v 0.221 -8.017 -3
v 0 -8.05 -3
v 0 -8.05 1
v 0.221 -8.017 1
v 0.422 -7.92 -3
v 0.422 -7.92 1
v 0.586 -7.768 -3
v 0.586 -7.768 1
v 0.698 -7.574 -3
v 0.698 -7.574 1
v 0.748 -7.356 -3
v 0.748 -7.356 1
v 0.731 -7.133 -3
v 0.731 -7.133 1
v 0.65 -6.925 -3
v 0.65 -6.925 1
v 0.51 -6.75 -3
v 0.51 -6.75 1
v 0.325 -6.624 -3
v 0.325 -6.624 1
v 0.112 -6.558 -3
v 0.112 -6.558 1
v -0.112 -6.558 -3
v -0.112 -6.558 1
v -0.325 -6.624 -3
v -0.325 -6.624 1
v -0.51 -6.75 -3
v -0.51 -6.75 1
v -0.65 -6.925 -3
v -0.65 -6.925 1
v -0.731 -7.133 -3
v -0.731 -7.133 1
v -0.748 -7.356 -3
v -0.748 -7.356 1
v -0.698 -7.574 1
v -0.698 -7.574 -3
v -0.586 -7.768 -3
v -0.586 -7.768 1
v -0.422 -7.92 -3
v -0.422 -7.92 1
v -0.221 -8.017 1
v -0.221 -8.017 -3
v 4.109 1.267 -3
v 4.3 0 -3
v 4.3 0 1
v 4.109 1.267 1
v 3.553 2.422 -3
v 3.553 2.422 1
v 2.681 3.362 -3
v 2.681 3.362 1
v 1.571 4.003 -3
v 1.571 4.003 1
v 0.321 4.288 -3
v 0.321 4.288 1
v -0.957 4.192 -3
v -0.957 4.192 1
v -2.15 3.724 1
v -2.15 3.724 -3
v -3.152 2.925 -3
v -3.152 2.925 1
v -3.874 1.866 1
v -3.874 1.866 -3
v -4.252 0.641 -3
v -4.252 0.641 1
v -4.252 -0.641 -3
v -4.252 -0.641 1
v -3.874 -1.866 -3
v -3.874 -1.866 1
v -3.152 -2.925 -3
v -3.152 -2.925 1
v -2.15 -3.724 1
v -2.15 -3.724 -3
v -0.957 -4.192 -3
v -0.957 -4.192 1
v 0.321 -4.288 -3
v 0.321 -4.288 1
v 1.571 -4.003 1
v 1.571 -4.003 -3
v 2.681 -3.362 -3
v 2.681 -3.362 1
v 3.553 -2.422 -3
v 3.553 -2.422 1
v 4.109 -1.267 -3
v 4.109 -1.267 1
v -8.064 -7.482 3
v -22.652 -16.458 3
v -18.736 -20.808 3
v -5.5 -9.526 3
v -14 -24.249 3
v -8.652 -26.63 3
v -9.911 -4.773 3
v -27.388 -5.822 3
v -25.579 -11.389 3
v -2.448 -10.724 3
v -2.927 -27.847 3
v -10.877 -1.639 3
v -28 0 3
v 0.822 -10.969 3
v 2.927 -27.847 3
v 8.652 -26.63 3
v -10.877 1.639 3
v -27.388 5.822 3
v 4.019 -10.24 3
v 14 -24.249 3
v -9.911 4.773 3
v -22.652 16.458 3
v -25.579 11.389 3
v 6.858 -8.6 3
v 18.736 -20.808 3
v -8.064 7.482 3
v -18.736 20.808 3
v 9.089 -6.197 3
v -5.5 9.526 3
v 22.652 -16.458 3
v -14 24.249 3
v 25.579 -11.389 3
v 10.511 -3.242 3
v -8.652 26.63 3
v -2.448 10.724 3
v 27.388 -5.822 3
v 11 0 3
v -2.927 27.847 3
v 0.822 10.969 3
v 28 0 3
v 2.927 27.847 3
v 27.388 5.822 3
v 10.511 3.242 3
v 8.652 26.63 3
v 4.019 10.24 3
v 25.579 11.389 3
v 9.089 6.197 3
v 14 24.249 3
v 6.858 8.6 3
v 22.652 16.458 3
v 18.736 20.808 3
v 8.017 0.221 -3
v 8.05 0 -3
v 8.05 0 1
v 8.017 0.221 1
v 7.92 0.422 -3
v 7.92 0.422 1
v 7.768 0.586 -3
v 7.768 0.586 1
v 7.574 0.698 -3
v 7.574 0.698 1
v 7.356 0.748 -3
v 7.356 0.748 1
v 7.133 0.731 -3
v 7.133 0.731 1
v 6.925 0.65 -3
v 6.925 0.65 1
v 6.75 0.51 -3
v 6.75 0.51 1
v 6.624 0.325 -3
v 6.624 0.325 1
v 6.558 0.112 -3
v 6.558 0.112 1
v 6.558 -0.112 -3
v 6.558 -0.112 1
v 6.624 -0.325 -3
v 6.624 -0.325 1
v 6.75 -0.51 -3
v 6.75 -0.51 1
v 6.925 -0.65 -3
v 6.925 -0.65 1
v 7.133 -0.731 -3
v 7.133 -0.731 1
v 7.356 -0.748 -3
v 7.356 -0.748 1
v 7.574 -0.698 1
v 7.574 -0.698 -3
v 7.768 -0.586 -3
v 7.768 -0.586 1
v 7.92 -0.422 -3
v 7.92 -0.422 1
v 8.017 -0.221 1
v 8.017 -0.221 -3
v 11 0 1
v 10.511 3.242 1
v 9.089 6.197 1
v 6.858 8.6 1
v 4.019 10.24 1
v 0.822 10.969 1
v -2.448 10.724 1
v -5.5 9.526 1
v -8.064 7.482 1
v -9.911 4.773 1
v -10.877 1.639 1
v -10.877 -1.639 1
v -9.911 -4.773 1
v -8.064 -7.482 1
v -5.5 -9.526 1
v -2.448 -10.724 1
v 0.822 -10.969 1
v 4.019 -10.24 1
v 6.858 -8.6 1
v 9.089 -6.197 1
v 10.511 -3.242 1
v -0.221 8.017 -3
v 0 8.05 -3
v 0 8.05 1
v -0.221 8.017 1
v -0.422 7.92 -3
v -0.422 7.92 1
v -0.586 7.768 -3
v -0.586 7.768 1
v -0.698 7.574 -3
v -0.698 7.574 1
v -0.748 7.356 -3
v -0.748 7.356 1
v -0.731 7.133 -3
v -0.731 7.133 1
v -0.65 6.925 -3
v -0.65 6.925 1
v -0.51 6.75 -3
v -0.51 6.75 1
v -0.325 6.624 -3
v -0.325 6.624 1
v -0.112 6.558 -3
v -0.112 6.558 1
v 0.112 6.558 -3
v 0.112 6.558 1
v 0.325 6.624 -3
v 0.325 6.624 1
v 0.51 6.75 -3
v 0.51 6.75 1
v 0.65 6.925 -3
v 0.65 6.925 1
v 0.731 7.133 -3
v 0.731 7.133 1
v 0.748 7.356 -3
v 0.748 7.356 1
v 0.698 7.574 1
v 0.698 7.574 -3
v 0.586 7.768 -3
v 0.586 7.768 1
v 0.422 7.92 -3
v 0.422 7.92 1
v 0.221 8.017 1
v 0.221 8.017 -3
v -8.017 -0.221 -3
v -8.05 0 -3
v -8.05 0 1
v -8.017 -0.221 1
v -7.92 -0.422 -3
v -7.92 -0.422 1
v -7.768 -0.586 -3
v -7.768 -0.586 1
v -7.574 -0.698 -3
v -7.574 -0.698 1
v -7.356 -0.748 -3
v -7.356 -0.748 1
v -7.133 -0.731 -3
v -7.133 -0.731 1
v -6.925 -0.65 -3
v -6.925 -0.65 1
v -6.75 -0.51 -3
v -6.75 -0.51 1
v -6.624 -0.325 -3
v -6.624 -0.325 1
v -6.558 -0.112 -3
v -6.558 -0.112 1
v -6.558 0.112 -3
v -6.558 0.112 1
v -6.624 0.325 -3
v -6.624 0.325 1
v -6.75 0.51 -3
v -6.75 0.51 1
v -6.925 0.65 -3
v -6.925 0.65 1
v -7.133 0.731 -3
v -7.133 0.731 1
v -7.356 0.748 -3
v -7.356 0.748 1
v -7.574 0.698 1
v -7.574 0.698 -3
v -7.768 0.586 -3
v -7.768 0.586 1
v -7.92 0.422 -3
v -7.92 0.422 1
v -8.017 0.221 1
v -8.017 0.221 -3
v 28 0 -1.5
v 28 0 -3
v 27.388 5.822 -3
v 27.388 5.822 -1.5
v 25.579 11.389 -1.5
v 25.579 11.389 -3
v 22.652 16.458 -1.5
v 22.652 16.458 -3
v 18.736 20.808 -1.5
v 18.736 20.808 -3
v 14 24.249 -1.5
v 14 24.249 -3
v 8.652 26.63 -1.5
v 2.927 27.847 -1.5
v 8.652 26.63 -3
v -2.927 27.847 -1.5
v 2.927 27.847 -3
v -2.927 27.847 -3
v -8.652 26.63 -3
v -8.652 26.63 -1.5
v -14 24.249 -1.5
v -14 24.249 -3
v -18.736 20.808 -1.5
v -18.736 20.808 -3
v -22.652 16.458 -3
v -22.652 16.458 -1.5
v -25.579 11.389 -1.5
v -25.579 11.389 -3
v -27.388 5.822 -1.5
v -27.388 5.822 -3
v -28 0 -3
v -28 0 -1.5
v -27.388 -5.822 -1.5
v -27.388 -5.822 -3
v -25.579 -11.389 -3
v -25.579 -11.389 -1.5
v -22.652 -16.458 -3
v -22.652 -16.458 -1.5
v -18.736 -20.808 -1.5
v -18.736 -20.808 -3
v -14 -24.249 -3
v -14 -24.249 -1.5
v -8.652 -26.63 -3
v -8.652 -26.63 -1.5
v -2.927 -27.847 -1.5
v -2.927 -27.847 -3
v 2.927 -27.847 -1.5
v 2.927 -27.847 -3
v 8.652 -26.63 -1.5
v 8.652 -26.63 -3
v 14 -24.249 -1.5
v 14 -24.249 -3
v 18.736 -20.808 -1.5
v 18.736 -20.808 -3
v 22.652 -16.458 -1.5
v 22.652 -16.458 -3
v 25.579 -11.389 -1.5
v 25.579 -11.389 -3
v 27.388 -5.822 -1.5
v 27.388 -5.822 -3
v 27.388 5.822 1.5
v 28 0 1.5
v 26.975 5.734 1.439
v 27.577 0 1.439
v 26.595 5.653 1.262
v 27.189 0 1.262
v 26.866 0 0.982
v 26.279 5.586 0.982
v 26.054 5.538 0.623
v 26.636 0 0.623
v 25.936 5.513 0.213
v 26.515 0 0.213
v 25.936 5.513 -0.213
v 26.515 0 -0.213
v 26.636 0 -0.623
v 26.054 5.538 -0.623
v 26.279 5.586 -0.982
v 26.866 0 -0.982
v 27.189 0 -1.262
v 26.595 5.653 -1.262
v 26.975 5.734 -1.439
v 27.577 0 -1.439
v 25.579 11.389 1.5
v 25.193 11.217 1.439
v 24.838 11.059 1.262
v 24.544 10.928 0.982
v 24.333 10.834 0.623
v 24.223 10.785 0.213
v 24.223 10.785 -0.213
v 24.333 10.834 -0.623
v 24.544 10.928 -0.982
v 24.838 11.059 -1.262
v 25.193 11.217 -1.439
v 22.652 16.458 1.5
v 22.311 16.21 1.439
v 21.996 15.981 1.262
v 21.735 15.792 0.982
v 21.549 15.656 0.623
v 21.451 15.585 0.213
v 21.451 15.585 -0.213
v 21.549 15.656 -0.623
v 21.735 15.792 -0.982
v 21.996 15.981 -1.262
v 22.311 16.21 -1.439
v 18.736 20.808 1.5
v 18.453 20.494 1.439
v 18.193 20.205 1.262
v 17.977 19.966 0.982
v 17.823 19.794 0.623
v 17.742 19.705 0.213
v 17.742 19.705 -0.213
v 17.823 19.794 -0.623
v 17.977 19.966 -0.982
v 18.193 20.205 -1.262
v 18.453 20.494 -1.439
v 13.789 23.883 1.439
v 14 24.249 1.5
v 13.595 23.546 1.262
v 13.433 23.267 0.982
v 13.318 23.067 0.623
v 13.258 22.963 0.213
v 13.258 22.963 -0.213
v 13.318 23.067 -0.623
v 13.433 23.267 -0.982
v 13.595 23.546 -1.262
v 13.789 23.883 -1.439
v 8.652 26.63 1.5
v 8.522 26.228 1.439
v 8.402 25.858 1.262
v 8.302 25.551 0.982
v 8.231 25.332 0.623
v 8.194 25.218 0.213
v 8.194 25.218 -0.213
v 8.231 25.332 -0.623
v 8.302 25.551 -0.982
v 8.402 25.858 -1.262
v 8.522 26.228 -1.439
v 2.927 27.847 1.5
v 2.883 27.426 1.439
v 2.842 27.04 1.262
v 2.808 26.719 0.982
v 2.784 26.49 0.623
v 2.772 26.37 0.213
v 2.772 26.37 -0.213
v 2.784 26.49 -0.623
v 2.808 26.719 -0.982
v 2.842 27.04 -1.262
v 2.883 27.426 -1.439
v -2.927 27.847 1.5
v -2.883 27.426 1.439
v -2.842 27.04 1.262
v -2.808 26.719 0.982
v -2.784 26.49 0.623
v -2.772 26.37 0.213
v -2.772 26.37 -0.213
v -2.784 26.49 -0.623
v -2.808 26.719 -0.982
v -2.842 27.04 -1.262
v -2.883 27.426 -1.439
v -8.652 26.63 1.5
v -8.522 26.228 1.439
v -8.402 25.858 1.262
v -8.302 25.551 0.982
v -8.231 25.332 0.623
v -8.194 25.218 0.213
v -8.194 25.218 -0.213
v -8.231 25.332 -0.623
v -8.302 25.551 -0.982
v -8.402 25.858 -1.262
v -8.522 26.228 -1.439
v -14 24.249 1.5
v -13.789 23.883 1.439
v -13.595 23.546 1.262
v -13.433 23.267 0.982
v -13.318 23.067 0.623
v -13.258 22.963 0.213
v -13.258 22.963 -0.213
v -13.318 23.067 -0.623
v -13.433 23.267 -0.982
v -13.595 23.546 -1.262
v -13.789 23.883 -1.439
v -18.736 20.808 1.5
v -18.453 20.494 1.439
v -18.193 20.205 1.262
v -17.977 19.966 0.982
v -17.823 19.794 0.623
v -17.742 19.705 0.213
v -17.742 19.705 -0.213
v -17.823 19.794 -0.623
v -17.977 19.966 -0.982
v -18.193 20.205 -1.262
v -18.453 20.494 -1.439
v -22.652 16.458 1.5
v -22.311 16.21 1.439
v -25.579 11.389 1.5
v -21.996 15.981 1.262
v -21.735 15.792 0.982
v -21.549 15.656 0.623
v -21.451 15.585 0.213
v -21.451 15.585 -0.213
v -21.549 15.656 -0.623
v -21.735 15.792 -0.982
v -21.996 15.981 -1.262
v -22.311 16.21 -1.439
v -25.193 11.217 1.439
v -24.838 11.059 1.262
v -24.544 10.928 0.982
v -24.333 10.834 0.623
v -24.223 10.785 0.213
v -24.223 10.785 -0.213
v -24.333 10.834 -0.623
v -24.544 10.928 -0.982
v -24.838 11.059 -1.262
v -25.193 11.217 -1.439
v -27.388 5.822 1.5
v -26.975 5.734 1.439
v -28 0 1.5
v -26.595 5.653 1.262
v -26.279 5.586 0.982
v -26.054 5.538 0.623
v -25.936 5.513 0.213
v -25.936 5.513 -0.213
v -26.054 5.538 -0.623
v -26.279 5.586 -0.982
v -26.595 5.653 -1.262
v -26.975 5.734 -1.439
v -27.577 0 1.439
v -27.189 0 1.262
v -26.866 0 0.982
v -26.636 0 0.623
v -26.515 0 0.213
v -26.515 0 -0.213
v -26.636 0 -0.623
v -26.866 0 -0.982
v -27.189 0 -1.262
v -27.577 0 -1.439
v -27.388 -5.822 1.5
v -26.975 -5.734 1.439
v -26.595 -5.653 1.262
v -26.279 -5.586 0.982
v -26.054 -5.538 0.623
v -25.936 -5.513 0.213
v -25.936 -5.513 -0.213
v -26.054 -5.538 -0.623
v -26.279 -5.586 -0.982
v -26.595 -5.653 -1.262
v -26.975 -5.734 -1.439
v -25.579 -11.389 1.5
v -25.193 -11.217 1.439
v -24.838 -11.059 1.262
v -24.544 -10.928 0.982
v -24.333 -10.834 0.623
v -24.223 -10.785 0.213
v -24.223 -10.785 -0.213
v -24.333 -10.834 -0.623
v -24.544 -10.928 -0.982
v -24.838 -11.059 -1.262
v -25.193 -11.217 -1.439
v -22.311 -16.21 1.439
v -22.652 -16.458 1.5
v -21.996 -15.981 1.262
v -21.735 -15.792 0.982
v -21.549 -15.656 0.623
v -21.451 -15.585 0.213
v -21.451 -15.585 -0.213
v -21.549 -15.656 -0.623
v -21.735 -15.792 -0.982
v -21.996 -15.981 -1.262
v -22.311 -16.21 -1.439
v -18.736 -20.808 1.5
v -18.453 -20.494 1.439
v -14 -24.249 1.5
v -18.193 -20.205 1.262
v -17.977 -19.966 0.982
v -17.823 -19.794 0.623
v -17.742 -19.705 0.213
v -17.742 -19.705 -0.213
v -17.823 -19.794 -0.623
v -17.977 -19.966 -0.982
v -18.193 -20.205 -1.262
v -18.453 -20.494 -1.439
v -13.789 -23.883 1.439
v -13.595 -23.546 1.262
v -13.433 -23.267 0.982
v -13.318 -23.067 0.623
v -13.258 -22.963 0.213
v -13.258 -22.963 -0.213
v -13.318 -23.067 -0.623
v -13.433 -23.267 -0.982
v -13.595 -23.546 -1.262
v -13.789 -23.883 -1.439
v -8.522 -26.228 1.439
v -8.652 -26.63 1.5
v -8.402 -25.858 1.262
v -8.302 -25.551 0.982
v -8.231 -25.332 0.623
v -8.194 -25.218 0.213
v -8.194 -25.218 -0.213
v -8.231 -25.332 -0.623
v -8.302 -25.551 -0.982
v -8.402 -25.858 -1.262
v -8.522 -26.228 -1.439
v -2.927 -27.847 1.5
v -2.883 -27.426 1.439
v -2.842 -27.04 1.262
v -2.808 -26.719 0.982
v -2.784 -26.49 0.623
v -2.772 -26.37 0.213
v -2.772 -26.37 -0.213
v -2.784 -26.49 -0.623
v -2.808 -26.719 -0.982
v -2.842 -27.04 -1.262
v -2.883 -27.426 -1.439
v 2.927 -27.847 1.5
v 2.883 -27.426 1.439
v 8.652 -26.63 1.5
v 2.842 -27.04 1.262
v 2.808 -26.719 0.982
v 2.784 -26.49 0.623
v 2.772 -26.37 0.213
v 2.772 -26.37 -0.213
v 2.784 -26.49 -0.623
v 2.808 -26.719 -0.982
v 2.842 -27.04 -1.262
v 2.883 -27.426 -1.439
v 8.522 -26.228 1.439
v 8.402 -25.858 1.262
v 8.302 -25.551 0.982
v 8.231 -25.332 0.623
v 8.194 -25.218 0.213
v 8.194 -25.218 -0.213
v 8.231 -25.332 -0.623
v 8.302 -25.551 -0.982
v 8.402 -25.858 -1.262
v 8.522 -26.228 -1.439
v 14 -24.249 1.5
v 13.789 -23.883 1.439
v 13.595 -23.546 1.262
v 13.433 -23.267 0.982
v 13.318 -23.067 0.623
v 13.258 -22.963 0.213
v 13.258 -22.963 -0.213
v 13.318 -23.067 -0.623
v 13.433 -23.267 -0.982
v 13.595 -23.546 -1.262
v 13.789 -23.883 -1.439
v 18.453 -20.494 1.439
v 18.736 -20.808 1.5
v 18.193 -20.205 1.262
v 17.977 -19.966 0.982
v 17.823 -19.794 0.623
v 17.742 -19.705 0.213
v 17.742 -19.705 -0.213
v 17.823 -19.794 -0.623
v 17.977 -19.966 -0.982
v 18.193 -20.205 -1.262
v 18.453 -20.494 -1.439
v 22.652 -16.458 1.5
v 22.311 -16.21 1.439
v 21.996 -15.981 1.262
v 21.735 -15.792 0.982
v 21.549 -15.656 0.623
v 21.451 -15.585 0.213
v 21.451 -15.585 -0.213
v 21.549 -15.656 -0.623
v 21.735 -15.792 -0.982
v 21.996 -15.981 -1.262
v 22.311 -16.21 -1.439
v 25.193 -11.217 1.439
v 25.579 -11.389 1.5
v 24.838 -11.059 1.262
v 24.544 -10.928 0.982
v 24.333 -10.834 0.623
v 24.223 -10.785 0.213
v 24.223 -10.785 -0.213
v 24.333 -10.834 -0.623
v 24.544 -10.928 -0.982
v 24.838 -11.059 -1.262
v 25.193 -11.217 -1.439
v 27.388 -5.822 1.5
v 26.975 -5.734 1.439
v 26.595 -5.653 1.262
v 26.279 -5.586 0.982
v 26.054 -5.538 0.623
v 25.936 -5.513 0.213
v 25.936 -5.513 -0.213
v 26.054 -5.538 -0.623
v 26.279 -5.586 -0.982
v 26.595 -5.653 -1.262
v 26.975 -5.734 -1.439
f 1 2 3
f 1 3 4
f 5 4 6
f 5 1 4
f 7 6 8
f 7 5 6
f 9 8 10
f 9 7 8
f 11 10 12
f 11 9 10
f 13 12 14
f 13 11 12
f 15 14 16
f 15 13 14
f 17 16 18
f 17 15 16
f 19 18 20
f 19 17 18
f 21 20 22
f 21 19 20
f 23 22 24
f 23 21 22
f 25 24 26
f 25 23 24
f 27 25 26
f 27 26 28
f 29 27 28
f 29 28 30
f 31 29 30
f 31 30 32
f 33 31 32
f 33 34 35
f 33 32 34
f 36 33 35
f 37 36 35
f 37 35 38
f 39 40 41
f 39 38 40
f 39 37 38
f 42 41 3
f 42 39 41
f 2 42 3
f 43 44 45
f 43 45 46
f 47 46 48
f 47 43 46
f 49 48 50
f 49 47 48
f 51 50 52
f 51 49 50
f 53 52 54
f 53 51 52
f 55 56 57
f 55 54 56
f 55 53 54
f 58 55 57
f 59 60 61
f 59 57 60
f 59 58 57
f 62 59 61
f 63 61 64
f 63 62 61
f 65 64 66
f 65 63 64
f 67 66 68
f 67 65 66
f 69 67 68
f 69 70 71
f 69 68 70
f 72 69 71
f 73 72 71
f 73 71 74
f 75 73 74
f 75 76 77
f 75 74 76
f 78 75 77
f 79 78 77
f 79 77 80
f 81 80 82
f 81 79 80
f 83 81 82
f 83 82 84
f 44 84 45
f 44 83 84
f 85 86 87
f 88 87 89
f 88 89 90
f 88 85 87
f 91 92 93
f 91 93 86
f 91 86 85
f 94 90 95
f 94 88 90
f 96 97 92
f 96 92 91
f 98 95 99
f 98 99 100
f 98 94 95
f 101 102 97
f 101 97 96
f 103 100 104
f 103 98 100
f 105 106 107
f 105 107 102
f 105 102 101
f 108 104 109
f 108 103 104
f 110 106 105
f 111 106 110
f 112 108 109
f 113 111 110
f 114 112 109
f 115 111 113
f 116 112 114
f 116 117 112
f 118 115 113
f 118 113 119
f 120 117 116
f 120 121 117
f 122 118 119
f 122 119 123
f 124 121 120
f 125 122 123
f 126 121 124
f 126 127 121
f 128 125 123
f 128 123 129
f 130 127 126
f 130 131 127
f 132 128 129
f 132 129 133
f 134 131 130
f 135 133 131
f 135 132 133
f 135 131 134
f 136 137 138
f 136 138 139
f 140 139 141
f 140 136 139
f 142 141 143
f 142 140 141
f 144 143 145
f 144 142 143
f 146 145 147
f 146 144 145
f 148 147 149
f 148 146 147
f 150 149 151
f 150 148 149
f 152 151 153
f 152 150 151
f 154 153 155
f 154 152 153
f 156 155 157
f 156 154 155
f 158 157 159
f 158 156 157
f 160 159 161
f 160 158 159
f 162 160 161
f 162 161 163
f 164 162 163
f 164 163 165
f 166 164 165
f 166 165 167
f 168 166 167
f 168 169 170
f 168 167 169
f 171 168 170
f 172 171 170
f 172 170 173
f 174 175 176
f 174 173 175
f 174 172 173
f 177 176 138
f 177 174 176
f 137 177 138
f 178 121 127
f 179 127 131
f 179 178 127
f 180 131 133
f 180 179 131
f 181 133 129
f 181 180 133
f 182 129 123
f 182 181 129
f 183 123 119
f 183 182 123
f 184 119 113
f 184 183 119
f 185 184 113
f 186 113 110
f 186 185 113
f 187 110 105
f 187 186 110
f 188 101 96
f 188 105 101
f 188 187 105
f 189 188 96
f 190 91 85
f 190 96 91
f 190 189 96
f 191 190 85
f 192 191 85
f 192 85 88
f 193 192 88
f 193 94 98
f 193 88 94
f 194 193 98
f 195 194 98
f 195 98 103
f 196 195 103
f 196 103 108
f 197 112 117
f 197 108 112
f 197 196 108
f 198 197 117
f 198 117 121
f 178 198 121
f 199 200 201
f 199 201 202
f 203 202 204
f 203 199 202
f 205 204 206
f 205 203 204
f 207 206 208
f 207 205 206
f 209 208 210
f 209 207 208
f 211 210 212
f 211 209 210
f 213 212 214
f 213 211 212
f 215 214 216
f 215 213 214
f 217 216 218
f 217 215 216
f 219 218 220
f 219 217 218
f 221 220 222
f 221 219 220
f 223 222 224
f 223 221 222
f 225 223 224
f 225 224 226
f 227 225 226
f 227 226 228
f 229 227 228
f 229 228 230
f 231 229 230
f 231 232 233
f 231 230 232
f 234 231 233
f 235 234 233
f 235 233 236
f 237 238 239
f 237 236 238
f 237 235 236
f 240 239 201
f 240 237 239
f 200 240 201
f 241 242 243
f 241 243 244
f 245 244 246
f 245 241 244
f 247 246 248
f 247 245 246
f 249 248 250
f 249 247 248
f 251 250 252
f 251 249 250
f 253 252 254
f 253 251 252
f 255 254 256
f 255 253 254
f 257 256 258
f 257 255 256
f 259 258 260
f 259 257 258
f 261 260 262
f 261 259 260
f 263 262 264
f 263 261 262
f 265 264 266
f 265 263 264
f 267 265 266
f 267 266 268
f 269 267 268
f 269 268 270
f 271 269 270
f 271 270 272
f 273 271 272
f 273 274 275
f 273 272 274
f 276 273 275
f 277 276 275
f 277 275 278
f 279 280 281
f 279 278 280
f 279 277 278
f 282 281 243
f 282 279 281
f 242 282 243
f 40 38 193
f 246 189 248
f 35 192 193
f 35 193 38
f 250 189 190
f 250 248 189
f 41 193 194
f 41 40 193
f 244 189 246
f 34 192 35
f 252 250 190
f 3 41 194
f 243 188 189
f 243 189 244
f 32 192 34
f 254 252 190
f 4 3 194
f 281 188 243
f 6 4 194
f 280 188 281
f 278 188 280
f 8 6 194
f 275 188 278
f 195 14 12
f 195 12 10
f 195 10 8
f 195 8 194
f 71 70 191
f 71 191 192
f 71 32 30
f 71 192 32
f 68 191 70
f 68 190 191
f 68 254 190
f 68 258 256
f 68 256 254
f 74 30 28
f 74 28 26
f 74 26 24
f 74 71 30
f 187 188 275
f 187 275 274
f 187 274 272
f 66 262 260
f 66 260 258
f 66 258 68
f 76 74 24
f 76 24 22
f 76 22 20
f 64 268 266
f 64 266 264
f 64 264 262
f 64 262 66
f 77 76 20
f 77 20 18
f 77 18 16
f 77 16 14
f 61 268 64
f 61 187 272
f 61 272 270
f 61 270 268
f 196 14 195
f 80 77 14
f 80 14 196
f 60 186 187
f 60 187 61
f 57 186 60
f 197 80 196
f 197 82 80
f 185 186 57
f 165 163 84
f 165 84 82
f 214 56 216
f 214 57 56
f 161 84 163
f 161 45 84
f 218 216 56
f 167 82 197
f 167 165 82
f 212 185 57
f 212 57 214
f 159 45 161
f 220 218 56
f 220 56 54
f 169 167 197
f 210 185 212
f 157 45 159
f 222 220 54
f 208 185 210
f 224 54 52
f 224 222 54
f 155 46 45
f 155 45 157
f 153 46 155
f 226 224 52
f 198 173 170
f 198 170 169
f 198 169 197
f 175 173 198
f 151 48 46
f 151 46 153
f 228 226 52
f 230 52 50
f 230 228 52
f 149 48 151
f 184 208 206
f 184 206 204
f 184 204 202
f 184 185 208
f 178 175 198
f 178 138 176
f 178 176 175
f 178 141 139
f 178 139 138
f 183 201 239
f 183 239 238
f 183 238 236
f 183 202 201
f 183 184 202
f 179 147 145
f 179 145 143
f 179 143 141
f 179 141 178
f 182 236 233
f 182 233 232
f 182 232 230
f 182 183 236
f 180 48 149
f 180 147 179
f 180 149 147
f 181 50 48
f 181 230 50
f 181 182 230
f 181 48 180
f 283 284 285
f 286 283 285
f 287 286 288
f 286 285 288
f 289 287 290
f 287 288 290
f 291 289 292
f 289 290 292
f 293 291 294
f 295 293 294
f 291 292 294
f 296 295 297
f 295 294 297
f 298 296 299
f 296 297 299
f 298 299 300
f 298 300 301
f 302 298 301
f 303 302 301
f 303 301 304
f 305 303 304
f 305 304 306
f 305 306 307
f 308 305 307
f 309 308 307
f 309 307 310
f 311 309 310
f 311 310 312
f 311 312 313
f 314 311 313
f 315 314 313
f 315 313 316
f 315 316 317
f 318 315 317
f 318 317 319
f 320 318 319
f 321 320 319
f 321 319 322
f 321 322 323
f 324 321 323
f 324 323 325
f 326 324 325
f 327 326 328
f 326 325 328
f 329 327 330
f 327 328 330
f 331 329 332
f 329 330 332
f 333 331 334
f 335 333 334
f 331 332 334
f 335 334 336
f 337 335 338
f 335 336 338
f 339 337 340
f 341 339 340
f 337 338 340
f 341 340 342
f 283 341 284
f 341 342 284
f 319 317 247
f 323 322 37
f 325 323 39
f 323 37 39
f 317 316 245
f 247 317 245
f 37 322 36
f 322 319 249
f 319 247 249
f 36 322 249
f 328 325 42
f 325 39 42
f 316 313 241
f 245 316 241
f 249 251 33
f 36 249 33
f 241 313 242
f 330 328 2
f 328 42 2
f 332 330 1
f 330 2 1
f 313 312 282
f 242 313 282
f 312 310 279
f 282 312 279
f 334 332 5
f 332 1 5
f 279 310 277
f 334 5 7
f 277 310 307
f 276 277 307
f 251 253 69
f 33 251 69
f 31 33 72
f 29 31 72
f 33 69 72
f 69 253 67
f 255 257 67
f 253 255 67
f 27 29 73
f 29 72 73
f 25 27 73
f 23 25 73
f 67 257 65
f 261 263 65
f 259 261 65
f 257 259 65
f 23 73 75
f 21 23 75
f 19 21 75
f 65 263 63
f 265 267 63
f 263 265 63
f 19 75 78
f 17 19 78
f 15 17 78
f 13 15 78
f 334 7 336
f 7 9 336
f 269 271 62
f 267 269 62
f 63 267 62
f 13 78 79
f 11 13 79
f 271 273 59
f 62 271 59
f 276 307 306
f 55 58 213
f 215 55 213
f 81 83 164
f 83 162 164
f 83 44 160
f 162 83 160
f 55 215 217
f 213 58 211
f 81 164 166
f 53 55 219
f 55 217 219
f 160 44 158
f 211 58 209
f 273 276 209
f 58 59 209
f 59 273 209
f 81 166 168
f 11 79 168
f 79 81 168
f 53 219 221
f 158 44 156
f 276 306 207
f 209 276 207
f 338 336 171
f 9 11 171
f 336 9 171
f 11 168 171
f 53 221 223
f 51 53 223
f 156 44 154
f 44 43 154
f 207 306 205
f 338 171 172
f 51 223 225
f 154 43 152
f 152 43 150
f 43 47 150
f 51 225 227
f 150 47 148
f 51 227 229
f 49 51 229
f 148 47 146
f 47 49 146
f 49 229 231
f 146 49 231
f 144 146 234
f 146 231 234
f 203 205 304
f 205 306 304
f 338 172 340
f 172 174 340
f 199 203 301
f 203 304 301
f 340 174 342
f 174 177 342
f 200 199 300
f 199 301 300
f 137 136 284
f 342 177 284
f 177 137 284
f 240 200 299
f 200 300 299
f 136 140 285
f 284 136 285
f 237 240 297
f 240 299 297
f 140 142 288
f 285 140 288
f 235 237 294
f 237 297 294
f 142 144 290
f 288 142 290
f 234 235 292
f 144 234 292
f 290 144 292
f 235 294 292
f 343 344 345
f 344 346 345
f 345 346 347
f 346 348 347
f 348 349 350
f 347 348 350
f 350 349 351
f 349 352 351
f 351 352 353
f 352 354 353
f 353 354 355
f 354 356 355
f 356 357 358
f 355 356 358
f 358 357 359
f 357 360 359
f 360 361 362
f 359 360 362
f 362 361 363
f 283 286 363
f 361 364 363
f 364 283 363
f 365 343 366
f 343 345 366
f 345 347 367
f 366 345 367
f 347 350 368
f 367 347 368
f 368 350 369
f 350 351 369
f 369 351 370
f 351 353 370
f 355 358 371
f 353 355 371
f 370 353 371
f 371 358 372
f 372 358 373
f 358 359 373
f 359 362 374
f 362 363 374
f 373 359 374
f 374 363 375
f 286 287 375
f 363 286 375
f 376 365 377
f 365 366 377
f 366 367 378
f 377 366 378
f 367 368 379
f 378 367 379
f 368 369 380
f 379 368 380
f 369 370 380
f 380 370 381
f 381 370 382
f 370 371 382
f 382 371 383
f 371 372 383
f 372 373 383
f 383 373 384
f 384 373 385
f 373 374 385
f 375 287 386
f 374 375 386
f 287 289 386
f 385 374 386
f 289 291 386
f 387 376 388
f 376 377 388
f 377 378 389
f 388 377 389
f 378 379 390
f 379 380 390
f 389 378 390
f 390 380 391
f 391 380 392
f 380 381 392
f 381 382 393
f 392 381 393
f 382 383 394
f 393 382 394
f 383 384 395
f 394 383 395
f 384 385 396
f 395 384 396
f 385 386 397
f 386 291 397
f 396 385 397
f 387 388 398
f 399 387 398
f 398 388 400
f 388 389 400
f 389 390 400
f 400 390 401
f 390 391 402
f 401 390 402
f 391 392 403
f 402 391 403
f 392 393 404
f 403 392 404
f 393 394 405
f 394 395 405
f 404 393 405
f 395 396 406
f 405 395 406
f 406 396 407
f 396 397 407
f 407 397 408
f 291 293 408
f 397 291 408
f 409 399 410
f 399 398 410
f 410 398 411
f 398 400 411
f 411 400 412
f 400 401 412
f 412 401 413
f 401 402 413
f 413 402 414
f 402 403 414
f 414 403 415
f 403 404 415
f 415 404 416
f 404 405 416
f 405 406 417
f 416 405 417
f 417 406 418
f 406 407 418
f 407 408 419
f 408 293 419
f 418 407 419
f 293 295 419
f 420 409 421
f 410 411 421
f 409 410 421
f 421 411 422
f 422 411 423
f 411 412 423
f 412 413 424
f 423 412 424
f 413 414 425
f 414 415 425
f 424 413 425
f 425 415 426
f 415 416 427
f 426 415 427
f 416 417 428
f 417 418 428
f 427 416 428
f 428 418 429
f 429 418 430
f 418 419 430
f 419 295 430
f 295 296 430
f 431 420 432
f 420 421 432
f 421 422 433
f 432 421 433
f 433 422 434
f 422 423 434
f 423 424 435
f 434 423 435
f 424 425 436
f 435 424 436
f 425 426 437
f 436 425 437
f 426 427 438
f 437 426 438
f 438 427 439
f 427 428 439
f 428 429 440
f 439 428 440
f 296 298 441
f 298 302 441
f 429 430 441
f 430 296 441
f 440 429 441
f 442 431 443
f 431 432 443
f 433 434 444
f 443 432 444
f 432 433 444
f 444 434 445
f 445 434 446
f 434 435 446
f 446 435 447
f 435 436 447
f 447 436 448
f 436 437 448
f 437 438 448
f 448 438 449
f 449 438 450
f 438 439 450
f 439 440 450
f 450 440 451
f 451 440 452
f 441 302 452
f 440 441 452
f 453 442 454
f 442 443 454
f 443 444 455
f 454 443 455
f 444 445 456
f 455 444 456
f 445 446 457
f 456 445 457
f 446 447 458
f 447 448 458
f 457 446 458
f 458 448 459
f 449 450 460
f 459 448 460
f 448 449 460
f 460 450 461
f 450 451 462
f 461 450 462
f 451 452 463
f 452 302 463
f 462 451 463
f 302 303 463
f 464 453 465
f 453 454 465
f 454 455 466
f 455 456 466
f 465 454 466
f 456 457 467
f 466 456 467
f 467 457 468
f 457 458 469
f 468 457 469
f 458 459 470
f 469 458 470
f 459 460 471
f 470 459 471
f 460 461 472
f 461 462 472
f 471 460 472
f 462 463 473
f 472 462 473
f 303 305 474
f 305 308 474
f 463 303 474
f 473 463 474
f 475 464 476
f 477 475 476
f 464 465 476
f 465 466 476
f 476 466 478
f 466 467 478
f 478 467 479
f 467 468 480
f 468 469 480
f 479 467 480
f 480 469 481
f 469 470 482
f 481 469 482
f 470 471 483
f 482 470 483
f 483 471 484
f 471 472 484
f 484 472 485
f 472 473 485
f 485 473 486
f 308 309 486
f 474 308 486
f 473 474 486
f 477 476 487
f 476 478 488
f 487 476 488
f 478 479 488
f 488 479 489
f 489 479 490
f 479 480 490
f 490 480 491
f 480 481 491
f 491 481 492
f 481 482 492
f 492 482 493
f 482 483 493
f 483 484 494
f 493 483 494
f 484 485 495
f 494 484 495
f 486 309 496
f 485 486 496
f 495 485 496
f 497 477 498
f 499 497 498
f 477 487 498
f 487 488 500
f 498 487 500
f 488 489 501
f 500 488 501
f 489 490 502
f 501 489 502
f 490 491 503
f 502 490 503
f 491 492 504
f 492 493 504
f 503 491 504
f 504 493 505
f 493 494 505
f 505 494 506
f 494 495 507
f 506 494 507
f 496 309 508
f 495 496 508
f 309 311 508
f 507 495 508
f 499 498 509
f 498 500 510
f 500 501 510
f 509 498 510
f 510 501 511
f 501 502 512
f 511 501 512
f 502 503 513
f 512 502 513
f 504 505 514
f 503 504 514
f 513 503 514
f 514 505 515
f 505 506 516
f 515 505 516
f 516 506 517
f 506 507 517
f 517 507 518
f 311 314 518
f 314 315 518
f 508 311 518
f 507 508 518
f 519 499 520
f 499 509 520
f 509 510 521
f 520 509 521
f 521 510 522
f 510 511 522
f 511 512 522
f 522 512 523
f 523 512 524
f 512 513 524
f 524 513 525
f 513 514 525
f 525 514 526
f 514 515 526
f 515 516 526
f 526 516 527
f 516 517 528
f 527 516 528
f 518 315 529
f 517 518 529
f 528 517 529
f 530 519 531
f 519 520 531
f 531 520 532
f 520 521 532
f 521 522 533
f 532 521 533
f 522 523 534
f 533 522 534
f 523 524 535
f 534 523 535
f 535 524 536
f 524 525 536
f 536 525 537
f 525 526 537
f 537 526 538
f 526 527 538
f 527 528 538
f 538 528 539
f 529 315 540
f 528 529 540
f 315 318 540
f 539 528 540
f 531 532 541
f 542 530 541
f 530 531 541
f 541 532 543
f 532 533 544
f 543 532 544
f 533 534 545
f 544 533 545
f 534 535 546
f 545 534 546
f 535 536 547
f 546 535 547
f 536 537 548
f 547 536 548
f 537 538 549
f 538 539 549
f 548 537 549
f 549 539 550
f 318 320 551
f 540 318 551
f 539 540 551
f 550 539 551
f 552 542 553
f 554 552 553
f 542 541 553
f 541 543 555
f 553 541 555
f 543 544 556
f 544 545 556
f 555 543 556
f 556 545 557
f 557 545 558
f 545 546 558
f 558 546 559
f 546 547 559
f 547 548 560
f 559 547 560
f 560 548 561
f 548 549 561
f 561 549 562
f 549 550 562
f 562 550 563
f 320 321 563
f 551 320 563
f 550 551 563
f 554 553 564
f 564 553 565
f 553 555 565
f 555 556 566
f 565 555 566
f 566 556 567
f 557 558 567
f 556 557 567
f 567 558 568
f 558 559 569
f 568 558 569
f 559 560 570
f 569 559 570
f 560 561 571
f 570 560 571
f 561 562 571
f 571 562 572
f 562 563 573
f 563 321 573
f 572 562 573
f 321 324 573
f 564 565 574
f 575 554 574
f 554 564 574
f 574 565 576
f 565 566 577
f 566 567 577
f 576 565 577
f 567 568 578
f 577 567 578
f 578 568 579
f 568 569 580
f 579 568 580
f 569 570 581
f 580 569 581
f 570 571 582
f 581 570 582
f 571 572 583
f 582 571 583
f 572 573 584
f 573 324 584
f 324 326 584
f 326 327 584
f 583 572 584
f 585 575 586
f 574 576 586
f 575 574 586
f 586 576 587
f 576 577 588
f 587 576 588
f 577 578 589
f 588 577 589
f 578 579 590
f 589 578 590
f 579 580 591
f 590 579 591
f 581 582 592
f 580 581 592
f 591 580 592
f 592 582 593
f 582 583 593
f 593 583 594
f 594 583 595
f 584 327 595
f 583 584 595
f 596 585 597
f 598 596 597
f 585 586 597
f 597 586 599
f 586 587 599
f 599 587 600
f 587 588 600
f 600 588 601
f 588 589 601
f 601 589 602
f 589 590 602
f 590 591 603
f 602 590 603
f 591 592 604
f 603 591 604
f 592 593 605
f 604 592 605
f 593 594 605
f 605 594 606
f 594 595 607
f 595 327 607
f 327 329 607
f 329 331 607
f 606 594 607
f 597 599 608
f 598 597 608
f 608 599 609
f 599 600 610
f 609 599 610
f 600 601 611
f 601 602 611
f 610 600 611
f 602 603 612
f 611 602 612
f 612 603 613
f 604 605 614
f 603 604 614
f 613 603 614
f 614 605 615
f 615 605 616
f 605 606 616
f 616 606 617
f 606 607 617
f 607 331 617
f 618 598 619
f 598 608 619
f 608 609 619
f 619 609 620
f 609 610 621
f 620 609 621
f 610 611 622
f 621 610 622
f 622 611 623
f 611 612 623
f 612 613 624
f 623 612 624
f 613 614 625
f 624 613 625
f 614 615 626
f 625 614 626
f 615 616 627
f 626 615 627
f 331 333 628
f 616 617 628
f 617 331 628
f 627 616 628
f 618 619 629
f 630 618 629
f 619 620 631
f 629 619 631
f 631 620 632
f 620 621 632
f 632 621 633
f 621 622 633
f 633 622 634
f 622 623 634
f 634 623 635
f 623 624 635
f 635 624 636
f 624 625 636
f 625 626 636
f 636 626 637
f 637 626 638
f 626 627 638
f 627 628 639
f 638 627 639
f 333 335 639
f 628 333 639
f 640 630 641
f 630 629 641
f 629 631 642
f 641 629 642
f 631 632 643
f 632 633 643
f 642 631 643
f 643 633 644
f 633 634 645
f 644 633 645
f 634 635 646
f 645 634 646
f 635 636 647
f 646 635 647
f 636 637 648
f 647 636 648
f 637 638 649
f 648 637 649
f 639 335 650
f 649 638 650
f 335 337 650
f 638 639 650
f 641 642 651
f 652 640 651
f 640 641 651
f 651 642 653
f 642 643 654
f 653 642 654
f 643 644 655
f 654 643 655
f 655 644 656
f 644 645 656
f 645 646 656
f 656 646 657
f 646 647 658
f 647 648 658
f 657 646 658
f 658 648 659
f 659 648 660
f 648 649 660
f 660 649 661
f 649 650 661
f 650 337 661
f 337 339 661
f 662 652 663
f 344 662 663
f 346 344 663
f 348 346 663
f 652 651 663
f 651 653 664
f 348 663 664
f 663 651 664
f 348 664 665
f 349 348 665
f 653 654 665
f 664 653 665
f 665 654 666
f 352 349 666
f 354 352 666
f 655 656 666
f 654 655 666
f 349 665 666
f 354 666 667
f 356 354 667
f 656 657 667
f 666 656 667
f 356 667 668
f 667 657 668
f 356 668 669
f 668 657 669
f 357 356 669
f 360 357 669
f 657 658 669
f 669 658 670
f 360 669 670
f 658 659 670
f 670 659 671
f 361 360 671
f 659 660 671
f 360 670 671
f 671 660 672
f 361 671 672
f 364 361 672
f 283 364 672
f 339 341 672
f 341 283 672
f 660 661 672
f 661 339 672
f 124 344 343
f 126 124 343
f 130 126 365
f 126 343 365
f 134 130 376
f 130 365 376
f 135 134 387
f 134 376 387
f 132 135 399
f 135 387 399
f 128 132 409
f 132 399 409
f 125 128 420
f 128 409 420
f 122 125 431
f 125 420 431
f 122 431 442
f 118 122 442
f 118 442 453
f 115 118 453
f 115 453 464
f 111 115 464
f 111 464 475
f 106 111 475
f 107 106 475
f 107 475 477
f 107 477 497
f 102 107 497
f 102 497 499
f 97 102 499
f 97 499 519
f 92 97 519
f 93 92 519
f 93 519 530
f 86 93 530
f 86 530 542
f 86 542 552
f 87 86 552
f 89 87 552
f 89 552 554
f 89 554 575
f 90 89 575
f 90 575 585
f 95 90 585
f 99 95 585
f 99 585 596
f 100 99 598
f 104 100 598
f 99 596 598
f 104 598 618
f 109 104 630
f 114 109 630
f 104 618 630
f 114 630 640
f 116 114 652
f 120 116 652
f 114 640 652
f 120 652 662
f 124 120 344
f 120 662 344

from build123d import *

# Parameters (mm, degrees)
CYLINDER003_R     = 0.75
CYLINDER003_DEPTH = 10
ARRAY_COUNT       = 4
CYLINDER002_R     = 4.3
CYLINDER002_DEPTH = 10
CYLINDER001_R     = 11
CYLINDER001_DEPTH = 10
TORUS_R           = 1.5
CYLINDER_R        = 28
CYLINDER_DEPTH    = 6


with BuildPart() as array:
    # Cylinder003 → Cylinder003 (new body)
    with BuildSketch(Plane(origin=(7.3, 0, -5), x_dir=(1, 0, 0), z_dir=(0, 0, 1))):
        Circle(CYLINDER003_R)
    extrude(amount=CYLINDER003_DEPTH)

    # Array: Array ×4 about axis
    array_axis = Axis((0, 0, 0), (0, 0, 1))


with BuildPart() as array_1:
    add(array.part)
    for i in range(1, ARRAY_COUNT):
        add(array.part.rotate(array_axis, i * 360 / ARRAY_COUNT))


with BuildPart() as hueco_del_eje:
    # Cylinder002 → Cylinder002 (new body)
    with BuildSketch(Plane.XY.offset(-4)):
        Circle(CYLINDER002_R)
    extrude(amount=CYLINDER002_DEPTH)


with BuildPart() as corona_servo:
    # Cylinder001 → Cylinder001 (new body)
    with BuildSketch(Plane.XY.offset(1)):
        Circle(CYLINDER001_R)
    extrude(amount=CYLINDER001_DEPTH)


with BuildPart() as hueco_junta_t_rica:
    # Torus → Torus (revolve)
    with BuildSketch(Plane.XZ):
        with Locations((28, 0)):
            Circle(TORUS_R)
    revolve(axis=Axis((0, 0, 0), (0, 0, 1)))


with BuildPart() as rueda_miniskybot:
    # Cylinder → Cylinder (new body)
    with BuildSketch(Plane.XY.offset(-3)):
        Circle(CYLINDER_R)
    extrude(amount=CYLINDER_DEPTH)

    # Cut: cut Hueco-Junta tórica
    add(hueco_junta_t_rica.part, mode=Mode.SUBTRACT)

    # Cut001: cut Corona servo
    add(corona_servo.part, mode=Mode.SUBTRACT)

    # Cut002: cut Hueco del eje
    add(hueco_del_eje.part, mode=Mode.SUBTRACT)

    # Cut003: cut Array
    add(array_1.part, mode=Mode.SUBTRACT)


solid = rueda_miniskybot.part
